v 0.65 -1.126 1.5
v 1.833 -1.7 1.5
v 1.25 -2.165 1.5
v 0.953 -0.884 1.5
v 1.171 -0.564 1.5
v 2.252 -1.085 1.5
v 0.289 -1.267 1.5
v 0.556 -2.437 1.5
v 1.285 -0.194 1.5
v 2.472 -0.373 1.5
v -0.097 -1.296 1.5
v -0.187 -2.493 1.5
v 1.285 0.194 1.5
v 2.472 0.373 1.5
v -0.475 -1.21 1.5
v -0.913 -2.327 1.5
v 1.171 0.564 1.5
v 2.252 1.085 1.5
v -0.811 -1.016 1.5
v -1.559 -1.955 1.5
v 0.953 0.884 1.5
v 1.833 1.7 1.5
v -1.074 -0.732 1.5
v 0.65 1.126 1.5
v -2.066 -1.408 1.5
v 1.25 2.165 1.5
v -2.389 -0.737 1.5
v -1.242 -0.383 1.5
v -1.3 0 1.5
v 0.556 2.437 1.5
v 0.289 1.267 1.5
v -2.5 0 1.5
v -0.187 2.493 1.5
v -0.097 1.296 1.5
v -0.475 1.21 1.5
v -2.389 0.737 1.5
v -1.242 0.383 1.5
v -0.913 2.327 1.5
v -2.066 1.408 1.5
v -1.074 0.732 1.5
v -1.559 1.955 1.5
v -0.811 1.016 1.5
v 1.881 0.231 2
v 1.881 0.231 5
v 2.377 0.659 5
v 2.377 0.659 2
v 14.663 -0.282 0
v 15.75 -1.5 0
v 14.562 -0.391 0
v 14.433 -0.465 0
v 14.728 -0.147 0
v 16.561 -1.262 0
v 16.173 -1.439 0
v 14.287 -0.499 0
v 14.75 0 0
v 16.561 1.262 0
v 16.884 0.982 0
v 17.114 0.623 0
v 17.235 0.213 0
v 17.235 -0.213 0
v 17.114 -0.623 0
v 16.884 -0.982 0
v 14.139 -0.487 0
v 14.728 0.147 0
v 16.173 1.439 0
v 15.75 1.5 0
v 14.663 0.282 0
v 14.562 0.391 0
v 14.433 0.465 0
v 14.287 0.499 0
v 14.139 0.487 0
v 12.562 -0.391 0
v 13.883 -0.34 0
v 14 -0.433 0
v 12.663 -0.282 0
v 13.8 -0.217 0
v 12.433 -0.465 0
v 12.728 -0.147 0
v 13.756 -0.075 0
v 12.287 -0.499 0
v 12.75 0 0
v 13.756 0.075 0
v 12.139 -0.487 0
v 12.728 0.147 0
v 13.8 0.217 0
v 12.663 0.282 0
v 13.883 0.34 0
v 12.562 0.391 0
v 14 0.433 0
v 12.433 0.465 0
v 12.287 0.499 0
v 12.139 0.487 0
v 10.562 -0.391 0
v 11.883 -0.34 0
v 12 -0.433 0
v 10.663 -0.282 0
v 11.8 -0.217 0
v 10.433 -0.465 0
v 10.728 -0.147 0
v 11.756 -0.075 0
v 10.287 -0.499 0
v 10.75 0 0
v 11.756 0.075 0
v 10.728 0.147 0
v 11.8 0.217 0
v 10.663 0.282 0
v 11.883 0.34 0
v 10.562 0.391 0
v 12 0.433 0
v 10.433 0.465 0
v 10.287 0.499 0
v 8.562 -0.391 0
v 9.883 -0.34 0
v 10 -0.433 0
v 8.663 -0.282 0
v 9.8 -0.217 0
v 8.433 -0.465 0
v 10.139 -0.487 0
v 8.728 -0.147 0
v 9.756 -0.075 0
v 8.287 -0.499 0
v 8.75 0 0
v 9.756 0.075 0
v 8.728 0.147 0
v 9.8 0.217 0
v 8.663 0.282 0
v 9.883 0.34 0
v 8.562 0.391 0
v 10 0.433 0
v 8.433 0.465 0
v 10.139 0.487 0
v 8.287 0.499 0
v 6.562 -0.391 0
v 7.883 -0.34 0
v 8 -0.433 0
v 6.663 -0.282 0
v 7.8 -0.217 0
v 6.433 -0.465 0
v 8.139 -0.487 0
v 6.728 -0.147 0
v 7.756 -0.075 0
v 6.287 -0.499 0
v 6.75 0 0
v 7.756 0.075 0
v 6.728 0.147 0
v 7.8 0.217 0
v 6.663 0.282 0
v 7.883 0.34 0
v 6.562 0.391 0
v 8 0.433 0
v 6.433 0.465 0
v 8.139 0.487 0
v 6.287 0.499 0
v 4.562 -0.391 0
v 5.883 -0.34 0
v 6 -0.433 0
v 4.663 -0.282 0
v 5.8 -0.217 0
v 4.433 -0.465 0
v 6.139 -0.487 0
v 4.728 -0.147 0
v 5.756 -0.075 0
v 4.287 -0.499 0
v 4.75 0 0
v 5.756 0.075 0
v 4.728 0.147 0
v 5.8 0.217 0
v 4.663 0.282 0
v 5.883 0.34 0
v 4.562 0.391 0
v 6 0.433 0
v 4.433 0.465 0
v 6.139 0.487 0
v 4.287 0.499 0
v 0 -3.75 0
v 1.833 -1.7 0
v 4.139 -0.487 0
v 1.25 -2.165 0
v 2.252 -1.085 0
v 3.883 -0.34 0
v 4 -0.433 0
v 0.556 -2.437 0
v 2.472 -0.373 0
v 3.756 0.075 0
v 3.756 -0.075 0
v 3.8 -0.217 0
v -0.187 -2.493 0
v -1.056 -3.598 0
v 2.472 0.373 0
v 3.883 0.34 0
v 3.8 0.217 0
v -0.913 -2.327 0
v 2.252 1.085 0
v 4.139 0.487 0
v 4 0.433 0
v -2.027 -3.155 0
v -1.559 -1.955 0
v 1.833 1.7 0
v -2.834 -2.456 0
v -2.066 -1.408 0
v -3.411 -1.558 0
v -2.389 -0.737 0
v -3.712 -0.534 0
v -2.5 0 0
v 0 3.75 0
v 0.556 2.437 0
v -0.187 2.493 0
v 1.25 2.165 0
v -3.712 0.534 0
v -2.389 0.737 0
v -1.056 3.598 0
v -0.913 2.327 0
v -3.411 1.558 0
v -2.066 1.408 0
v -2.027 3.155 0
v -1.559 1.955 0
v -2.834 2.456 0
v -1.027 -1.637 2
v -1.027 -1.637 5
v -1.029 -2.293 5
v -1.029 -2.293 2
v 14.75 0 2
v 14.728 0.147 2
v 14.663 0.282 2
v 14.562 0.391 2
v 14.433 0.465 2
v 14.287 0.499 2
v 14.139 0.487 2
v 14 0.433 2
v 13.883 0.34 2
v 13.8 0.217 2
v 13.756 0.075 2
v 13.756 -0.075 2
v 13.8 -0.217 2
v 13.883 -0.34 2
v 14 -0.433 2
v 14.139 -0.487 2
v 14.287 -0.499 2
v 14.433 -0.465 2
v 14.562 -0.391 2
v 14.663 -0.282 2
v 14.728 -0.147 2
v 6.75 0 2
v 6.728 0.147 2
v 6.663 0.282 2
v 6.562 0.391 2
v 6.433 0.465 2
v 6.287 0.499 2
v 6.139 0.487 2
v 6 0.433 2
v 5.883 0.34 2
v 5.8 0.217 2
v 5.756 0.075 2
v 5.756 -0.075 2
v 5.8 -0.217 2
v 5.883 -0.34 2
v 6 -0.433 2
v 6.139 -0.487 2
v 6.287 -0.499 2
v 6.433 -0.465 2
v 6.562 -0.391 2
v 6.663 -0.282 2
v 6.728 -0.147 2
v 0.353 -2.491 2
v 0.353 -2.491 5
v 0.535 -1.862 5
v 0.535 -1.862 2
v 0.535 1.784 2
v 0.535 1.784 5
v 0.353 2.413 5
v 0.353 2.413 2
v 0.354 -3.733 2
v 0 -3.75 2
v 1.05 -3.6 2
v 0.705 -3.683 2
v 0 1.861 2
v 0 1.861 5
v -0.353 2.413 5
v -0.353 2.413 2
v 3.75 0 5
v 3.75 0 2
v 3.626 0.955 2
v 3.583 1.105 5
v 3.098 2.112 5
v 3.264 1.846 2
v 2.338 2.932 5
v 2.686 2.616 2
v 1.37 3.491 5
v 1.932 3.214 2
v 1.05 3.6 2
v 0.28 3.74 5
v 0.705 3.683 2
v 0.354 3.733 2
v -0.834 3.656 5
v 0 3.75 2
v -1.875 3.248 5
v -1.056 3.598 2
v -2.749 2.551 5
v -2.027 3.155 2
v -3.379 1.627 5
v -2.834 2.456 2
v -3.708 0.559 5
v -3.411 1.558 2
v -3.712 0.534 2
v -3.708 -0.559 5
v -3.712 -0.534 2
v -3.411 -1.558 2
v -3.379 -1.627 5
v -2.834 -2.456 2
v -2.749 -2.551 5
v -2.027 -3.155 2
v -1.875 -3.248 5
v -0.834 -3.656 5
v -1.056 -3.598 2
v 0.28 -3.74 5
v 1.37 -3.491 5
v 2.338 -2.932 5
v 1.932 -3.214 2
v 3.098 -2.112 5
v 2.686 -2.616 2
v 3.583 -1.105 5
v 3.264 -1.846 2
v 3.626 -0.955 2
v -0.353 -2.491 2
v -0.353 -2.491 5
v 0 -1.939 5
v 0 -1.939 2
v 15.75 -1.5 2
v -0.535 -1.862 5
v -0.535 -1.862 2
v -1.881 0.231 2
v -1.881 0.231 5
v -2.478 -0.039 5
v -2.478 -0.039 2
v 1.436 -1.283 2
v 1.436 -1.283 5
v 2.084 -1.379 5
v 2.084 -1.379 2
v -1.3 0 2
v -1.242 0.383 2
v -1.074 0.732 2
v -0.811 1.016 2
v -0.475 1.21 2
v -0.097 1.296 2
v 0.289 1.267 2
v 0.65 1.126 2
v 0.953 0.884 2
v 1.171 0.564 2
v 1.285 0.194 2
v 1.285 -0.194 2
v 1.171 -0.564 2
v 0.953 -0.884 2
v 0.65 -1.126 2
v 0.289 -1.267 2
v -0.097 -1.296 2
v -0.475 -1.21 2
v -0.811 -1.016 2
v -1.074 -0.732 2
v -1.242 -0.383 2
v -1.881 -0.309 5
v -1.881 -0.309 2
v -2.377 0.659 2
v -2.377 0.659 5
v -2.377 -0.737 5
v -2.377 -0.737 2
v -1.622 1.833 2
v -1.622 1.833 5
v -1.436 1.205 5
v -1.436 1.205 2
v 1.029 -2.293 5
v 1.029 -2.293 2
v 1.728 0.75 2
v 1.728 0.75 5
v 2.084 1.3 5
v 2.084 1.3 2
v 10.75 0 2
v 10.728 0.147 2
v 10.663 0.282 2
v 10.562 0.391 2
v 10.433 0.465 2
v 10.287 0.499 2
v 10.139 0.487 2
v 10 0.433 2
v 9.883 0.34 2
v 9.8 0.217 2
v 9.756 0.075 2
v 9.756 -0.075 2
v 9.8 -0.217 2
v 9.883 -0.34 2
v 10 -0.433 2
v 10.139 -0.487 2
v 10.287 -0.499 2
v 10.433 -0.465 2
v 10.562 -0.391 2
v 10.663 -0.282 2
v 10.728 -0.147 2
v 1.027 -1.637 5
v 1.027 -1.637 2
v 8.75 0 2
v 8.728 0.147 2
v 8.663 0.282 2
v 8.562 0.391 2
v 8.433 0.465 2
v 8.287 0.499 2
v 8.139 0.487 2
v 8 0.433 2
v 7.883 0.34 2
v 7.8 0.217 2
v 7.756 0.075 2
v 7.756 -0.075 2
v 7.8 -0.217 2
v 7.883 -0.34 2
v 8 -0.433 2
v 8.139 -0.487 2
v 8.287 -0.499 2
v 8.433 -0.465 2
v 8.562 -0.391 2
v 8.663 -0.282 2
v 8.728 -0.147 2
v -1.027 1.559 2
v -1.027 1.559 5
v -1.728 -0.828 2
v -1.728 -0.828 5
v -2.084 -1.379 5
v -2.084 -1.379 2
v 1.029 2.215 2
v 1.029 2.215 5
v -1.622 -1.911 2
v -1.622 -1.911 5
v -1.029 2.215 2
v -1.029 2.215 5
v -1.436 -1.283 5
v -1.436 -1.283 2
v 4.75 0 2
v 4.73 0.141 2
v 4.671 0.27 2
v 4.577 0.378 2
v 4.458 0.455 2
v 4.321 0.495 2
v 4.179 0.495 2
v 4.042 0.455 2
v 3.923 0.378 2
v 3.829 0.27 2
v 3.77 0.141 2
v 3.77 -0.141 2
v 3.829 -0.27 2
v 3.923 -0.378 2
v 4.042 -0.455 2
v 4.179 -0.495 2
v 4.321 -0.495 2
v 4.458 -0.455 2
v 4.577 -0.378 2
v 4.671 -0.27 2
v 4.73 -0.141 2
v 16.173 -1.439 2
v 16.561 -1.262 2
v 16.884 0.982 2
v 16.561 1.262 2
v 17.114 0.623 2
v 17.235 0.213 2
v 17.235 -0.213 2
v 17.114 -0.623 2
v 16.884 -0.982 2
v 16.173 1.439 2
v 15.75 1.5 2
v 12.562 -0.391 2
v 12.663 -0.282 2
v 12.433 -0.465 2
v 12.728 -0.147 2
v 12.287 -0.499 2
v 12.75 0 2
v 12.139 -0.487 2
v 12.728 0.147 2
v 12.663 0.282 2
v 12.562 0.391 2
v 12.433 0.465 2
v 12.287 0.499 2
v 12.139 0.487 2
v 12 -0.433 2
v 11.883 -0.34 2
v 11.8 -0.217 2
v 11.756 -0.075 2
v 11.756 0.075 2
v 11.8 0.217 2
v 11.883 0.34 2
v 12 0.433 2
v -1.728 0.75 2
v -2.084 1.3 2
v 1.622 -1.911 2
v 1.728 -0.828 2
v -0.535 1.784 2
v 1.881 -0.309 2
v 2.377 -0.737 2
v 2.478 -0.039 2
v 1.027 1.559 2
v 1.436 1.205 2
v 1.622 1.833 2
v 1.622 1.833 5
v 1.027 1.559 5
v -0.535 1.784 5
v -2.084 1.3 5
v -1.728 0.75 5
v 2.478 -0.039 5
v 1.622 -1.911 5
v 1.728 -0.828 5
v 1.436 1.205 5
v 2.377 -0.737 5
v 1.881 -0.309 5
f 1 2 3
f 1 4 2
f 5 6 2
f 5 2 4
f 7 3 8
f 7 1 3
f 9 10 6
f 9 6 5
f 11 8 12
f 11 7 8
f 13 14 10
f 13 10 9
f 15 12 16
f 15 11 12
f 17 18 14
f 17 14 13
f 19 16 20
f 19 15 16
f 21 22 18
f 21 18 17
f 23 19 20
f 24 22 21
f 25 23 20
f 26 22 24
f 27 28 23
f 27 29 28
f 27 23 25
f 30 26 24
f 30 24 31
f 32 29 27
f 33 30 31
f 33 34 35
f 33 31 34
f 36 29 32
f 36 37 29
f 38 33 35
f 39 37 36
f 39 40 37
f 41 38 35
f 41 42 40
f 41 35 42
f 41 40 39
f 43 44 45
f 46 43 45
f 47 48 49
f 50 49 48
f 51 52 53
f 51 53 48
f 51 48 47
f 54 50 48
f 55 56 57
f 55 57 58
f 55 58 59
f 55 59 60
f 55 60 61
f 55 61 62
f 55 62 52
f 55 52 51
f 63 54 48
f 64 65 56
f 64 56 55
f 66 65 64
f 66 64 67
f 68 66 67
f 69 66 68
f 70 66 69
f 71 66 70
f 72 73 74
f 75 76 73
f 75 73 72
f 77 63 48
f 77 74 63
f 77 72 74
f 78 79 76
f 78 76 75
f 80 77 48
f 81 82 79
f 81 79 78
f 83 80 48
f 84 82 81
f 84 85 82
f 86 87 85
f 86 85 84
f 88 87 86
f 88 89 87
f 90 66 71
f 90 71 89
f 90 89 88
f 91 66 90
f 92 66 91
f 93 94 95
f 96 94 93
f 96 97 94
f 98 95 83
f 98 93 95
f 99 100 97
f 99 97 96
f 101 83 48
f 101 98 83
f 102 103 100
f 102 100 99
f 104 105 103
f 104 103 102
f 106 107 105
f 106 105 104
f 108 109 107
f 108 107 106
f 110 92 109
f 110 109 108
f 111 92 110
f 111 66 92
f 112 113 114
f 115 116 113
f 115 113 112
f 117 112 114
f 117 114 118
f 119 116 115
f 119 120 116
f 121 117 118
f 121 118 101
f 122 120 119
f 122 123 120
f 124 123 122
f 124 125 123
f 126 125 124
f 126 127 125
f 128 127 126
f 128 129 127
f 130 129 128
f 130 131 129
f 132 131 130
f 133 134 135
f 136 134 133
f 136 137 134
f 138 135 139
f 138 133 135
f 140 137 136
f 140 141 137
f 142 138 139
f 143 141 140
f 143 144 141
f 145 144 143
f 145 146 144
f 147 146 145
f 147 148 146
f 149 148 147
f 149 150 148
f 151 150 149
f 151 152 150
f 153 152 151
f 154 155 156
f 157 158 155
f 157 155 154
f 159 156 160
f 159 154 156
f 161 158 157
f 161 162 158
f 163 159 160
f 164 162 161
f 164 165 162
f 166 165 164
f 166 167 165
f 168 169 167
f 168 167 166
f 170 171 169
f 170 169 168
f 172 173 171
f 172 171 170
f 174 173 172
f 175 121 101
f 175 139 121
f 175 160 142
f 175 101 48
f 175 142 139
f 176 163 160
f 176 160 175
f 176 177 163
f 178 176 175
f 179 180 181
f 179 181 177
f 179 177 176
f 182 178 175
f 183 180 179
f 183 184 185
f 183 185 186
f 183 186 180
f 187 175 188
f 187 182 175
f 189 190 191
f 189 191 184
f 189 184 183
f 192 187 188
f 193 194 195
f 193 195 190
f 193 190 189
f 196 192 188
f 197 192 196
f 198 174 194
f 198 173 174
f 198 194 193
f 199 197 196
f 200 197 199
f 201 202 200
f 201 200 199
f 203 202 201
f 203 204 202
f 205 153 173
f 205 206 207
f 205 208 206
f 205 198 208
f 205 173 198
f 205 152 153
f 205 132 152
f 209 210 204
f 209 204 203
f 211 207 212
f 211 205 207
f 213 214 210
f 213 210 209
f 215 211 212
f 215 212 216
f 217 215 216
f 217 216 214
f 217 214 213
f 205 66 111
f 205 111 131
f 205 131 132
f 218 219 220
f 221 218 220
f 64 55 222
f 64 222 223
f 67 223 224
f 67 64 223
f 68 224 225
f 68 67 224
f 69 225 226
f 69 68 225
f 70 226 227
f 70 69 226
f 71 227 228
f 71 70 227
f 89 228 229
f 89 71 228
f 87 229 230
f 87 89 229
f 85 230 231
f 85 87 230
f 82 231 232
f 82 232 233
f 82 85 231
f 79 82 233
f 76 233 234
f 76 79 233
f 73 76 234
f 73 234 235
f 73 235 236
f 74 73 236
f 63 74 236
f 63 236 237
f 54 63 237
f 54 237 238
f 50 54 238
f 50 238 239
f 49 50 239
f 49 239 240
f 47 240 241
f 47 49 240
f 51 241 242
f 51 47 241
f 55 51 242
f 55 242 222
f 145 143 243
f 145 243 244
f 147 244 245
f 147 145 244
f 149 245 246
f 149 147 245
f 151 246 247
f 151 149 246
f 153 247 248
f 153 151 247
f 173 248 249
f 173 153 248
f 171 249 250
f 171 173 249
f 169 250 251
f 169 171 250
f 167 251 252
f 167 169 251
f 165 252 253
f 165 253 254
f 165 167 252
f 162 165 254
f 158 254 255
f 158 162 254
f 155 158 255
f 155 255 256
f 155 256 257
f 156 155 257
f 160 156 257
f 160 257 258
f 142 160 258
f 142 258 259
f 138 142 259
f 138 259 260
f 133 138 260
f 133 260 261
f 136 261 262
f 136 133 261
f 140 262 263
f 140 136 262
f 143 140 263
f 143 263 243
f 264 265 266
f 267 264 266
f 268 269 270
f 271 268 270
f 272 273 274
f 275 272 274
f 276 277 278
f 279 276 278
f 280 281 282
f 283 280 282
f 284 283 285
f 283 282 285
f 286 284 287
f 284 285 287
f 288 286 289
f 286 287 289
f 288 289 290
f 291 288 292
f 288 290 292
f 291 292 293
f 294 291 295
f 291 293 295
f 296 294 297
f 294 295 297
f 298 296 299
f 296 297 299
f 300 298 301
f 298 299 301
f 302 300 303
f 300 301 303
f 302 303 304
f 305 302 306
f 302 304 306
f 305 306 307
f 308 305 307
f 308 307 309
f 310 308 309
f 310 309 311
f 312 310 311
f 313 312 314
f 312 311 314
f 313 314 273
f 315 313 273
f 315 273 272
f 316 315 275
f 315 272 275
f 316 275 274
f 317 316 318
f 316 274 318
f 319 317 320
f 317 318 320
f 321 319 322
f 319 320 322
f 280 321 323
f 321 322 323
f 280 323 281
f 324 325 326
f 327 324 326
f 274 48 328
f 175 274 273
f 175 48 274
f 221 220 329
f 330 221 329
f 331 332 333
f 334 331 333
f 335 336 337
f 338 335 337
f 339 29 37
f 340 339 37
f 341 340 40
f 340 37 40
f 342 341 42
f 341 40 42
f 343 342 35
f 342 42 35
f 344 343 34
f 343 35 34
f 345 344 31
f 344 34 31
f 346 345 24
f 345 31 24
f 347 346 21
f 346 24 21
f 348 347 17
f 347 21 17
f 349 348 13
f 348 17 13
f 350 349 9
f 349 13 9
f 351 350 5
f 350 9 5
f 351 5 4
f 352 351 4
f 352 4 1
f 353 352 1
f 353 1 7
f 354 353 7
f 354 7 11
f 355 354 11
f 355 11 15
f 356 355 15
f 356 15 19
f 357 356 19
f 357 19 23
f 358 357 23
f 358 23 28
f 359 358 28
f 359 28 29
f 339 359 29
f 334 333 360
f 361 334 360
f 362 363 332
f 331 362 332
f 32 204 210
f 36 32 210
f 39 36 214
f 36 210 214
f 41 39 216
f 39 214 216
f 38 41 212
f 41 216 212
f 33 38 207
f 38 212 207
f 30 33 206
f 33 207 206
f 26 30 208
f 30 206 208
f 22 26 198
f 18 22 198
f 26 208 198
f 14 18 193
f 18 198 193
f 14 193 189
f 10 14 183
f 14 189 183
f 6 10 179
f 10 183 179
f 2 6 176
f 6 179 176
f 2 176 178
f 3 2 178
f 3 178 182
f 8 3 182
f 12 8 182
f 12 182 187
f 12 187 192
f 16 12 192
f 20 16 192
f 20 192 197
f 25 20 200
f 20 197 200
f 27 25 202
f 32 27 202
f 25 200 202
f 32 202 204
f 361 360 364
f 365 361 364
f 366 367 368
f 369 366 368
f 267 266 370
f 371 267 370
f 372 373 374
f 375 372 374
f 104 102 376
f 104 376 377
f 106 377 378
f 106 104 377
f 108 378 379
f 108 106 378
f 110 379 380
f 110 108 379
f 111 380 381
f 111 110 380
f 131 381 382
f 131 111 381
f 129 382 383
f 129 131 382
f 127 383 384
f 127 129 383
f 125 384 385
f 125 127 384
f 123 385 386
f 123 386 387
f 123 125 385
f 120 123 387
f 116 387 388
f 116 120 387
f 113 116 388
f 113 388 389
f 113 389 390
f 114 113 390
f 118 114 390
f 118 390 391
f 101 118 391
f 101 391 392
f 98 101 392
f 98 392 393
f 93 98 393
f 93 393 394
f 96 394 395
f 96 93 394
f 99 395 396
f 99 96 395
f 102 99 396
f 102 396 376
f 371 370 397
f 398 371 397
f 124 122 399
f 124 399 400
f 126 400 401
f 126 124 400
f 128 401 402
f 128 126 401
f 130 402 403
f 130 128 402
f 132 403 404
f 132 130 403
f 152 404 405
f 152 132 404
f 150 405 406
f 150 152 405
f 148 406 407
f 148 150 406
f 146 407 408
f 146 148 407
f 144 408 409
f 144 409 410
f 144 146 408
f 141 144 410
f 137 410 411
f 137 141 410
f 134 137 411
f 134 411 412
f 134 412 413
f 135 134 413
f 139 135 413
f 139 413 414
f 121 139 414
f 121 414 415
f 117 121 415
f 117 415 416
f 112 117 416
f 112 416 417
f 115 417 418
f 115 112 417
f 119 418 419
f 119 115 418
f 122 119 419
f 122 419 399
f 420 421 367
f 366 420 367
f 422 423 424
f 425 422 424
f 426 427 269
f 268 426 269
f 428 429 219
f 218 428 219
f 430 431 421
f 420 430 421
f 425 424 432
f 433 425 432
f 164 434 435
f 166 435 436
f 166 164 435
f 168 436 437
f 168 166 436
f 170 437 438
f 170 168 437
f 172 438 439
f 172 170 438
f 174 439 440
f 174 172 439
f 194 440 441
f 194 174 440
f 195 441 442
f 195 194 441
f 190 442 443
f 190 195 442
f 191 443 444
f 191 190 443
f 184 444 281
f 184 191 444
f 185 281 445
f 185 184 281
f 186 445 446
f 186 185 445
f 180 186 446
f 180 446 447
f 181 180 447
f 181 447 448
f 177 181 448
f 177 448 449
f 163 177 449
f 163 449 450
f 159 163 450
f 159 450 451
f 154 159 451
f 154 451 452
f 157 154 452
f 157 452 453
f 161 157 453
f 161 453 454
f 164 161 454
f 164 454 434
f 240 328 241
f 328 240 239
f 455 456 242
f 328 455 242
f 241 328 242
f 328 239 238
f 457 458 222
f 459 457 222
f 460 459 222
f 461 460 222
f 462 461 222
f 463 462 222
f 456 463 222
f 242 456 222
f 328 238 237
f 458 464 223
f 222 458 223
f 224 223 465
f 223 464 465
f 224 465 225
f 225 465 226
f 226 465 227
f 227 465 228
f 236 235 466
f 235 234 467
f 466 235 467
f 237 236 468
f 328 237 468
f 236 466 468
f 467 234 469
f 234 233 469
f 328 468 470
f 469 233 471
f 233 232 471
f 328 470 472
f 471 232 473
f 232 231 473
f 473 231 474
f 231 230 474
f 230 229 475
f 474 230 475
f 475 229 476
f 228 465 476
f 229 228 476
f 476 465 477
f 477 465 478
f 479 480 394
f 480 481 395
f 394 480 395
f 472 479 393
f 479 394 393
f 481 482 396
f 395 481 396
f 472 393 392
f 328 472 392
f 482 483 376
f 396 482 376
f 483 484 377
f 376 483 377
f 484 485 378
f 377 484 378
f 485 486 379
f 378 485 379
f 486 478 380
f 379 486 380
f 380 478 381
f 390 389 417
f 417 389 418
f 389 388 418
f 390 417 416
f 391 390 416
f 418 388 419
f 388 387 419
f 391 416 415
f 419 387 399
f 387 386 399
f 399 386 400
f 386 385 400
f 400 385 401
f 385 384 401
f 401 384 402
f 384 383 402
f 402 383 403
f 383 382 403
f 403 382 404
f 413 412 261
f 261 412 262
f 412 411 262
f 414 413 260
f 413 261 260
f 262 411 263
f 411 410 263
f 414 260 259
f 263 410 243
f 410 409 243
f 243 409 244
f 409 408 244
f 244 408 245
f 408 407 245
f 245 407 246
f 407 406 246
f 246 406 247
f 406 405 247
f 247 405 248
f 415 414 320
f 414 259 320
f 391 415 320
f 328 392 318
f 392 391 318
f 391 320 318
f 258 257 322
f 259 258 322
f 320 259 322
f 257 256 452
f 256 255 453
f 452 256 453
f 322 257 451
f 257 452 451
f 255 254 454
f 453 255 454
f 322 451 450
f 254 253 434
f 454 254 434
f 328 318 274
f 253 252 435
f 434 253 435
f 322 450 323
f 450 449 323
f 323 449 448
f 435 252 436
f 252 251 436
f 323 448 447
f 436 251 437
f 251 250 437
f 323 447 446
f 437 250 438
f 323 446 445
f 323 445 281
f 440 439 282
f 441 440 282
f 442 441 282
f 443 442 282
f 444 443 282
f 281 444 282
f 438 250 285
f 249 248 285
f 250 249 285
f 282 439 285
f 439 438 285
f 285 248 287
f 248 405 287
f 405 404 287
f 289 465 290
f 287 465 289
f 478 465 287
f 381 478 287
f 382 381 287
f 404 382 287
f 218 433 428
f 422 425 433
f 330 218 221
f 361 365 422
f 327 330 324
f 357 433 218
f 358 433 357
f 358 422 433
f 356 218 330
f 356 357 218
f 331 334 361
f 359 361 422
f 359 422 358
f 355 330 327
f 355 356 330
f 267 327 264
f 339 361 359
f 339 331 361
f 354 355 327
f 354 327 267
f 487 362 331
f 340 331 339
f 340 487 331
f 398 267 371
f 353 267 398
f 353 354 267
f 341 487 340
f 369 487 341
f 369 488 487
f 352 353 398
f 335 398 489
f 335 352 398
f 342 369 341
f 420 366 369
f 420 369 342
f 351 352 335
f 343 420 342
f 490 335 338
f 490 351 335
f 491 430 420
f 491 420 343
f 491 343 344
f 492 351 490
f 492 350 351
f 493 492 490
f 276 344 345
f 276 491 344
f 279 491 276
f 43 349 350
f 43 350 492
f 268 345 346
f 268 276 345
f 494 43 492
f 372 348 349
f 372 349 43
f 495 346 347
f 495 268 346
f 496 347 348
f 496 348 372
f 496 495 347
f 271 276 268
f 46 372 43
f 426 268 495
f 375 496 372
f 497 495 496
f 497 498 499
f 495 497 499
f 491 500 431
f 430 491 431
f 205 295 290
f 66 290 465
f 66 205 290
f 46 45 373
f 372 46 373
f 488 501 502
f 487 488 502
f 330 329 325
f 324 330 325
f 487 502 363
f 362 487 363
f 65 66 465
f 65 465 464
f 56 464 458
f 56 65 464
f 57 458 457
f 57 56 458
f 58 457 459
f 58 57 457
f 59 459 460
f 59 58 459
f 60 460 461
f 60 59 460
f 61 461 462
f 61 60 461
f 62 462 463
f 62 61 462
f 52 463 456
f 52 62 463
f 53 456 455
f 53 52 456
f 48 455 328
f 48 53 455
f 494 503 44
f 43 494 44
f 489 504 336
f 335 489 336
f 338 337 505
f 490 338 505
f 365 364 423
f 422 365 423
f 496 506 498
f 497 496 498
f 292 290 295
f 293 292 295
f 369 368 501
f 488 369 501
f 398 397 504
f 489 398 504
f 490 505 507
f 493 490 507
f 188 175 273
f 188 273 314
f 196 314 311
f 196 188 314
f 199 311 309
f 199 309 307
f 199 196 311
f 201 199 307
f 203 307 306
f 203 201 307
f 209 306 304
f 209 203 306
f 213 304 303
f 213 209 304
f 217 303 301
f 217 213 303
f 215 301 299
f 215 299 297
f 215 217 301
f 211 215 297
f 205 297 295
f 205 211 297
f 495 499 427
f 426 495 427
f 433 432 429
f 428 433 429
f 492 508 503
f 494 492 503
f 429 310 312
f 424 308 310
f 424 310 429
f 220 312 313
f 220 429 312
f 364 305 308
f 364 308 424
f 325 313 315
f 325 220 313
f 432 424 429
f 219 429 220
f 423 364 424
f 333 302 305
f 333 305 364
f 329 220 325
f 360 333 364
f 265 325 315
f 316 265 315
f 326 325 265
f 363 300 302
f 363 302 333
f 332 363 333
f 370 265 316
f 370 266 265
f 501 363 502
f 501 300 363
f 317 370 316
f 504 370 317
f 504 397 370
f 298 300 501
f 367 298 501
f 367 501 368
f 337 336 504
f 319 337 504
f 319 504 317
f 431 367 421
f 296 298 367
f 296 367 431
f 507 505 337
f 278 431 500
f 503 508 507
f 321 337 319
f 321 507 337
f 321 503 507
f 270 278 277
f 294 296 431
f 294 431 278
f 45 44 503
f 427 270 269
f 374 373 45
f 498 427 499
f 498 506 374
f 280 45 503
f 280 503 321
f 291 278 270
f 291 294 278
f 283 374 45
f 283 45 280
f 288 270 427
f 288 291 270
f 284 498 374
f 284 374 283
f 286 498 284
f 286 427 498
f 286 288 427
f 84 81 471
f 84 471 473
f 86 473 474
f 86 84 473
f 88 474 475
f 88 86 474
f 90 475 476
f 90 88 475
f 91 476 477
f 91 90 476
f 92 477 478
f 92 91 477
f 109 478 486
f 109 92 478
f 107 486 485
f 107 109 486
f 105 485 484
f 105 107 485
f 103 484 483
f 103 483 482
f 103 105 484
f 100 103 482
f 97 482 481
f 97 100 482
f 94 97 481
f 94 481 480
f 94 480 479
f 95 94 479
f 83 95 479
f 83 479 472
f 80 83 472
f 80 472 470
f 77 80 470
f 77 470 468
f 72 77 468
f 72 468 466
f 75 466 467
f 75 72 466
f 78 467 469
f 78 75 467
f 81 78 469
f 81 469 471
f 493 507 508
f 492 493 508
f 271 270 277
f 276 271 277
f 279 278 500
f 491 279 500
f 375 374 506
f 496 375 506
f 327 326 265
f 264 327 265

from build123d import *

# Parameters (mm, degrees)
SKETCH_1_R          = 0.5
EXTRUDE_1_DEPTH     = 2
SKETCH_2_R          = 2.5
CUT_EXTRUDE_1_DEPTH = 1.5
SKETCH_3_R          = 3.75
EXTRUDE_2_DEPTH     = 3
SKETCH_4_R          = 1.3
CUT_EXTRUDE_2_DEPTH = 9
SKETCH_5_R          = 1.3
CUT_EXTRUDE_4_DEPTH = 3


with BuildPart() as part:
    # 草图1 → 凸台-拉伸1 (new body)
    with BuildSketch(Plane.XY):
        with BuildLine():
            Line((0, 3.75), (15.75, 1.5))
            ThreePointArc((15.75, 1.5), (17.25, 0), (15.75, -1.5))
            Line((15.75, -1.5), (0, -3.75))
            ThreePointArc((0, -3.75), (-3.75, 0), (0, 3.75))
        make_face()
        with Locations((14.25, 0)):
            Circle(SKETCH_1_R, mode=Mode.SUBTRACT)
        with Locations((12.25, 0)):
            Circle(SKETCH_1_R, mode=Mode.SUBTRACT)
        with Locations((10.25, 0)):
            Circle(SKETCH_1_R, mode=Mode.SUBTRACT)
        with Locations((8.25, 0)):
            Circle(SKETCH_1_R, mode=Mode.SUBTRACT)
        with Locations((6.25, 0)):
            Circle(SKETCH_1_R, mode=Mode.SUBTRACT)
        with Locations((4.25, 0)):
            Circle(SKETCH_1_R, mode=Mode.SUBTRACT)
    extrude(amount=EXTRUDE_1_DEPTH)

    # 草图2 → 切除-拉伸1 (cut)
    with BuildSketch(Plane(origin=(0, 0, 0), x_dir=(-1, 0, 0), z_dir=(0, 0, -1))):
        Circle(SKETCH_2_R)
    extrude(amount=-CUT_EXTRUDE_1_DEPTH, mode=Mode.SUBTRACT)

    # 草图3 → 凸台-拉伸2 (add)
    with BuildSketch(Plane.XY.offset(2)):
        Circle(SKETCH_3_R)
    extrude(amount=EXTRUDE_2_DEPTH)

    # 草图4 → 切除-拉伸2 (cut)
    with BuildSketch(Plane(origin=(0, 0, 1.5), x_dir=(-1, 0, 0), z_dir=(0, 0, -1))):
        Circle(SKETCH_4_R)
    extrude(amount=-CUT_EXTRUDE_2_DEPTH, mode=Mode.SUBTRACT)

    # 草图5 → 切除-拉伸4 (cut)
    with BuildSketch(Plane.XY.offset(5)):
        Polygon((0, -1.939028966), (0.352599159, -2.491409984), (0.535291858, -1.862065615), (1.02923199, -2.292732659), (1.027217553, -1.637410678), (1.622482567, -1.911473664), (1.435924191, -1.28326436), (2.084289255, -1.378520335), (1.728300791, -0.82831749), (2.377239224, -0.737049382), (1.88066074, -0.309427158), (2.477599408, -0.039028966), (1.88066074, 0.231369227), (2.377239224, 0.658991451), (1.728300791, 0.750259559), (2.084289255, 1.300462404), (1.435924191, 1.205206429), (1.622482567, 1.833415733), (1.027217553, 1.559352747), (1.02923199, 2.214674728), (0.535291858, 1.784007684), (0.352599159, 2.413352053), (0, 1.860971034), (-0.352599159, 2.413352053), (-0.535291858, 1.784007684), (-1.02923199, 2.214674728), (-1.027217553, 1.559352747), (-1.622482567, 1.833415733), (-1.435924191, 1.205206429), (-2.084289255, 1.300462404), (-1.728300791, 0.750259559), (-2.377239224, 0.658991451), (-1.88066074, 0.231369227), (-2.477599408, -0.039028966), (-1.88066074, -0.309427158), (-2.377239224, -0.737049382), (-1.728300791, -0.82831749), (-2.084289255, -1.378520335), (-1.435924191, -1.28326436), (-1.622482567, -1.911473664), (-1.027217553, -1.637410678), (-1.02923199, -2.292732659), (-0.535291858, -1.862065615), (-0.352599159, -2.491409984), align=None)
        Circle(SKETCH_5_R, mode=Mode.SUBTRACT)
    extrude(amount=-CUT_EXTRUDE_4_DEPTH, mode=Mode.SUBTRACT)


solid = part.part
